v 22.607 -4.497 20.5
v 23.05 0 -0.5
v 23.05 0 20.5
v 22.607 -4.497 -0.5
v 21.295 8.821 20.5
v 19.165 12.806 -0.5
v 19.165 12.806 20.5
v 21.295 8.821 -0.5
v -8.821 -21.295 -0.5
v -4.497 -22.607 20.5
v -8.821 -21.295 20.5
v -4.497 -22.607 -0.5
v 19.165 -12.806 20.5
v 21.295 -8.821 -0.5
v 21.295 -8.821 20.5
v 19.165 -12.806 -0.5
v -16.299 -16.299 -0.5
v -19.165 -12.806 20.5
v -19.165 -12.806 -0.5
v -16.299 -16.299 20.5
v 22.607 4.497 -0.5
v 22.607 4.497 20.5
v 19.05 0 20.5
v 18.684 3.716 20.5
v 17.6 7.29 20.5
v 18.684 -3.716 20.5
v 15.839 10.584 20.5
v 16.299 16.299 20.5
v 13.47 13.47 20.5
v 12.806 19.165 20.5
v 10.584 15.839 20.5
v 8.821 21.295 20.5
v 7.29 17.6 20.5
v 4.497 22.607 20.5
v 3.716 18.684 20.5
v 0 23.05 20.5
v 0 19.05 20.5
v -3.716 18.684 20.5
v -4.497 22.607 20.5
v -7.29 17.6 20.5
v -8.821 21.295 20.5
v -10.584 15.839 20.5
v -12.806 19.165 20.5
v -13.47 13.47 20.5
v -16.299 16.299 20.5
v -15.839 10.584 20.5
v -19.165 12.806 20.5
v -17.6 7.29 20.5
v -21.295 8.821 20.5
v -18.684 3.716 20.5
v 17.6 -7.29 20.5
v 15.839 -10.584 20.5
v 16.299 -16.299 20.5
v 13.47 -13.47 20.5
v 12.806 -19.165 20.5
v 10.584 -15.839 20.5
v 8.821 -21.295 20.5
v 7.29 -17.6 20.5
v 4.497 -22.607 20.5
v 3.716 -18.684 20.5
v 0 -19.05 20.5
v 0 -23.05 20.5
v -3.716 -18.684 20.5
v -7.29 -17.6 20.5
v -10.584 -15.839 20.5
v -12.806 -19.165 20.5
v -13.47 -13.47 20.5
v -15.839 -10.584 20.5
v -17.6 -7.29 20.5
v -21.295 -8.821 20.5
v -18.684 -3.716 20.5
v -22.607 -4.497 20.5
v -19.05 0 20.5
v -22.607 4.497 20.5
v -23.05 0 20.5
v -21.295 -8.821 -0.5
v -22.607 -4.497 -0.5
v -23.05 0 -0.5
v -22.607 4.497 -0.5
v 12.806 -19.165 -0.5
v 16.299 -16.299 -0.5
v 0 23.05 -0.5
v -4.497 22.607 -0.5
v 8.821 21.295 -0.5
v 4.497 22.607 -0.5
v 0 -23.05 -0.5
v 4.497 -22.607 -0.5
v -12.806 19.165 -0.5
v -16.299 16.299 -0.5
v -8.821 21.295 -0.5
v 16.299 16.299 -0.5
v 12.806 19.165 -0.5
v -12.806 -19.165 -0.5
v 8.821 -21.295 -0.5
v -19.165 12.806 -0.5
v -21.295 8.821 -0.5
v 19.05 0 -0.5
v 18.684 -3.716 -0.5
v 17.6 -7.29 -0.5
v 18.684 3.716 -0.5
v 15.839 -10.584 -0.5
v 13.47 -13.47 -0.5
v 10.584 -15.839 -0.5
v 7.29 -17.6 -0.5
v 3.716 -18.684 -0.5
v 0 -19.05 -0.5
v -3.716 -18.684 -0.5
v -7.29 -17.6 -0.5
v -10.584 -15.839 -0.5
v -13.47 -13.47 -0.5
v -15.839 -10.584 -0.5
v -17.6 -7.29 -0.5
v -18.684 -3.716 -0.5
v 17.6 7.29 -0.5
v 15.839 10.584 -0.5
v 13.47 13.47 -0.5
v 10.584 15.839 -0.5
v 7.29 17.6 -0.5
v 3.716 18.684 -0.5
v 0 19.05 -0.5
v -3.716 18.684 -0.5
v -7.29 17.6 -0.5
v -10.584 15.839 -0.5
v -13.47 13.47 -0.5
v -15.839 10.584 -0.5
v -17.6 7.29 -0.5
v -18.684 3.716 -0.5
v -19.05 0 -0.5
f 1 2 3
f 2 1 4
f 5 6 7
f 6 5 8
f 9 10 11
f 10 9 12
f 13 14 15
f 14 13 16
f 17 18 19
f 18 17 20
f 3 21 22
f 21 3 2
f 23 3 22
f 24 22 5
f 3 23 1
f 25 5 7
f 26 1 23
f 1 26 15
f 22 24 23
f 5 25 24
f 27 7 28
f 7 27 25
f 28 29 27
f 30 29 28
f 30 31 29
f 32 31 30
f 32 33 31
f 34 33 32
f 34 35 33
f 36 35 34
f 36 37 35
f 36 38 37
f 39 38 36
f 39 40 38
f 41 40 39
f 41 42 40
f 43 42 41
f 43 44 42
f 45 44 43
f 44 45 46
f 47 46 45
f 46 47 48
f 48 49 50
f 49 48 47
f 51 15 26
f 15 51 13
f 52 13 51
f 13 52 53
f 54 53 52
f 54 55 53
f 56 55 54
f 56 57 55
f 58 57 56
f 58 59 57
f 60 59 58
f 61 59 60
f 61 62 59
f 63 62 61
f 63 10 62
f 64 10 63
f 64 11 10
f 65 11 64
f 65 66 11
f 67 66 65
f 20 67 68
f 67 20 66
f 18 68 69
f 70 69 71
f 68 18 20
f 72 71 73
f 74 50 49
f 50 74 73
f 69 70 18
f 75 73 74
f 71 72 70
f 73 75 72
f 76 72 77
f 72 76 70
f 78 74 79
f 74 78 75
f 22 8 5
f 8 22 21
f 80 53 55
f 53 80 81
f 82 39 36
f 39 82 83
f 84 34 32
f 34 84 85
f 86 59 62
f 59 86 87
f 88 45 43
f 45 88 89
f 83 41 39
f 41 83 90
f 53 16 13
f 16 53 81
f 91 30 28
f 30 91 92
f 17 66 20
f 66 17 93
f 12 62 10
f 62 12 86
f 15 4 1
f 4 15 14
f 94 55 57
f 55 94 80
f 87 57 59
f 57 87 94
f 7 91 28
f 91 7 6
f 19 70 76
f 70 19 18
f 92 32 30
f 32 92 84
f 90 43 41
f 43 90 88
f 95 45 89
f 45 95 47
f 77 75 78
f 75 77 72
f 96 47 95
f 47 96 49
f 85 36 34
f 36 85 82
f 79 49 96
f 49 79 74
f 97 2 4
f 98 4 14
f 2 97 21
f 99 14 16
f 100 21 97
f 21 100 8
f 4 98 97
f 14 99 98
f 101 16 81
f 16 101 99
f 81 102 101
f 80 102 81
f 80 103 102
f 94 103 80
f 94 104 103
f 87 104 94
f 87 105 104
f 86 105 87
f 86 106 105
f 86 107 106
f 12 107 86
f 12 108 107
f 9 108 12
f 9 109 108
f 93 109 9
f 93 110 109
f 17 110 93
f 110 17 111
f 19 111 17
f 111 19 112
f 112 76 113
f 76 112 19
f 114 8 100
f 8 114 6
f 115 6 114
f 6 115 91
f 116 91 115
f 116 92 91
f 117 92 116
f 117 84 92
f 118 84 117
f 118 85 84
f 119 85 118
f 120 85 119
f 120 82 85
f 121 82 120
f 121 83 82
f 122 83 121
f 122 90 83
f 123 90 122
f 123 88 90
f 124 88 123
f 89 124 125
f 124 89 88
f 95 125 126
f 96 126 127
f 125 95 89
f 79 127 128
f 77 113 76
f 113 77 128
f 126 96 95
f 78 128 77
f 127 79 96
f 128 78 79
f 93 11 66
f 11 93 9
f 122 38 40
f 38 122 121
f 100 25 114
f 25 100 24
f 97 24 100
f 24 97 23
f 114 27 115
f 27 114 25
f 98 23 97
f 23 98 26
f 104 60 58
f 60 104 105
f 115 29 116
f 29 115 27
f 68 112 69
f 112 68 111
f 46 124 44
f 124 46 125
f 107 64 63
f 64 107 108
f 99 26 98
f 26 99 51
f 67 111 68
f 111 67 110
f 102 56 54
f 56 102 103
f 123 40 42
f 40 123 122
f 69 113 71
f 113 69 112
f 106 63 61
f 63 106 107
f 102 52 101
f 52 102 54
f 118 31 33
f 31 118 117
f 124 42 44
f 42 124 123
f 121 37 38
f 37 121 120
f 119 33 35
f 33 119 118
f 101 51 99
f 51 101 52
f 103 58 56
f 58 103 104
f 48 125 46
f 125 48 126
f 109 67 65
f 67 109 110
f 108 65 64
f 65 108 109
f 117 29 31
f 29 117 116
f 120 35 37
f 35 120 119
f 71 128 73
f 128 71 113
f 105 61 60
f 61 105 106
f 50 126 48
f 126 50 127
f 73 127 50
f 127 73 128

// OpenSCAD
$fn = 32;

// ----------------------------------------------------------------------
// Two-module gear rim: z18 m2 and z28 m1.5, 20 mm wide
// ----------------------------------------------------------------------

// --- parameters (mm) ---
module_a = 2;             // first tooth module
teeth_a = 18;             // first band tooth count
module_b = 1.5;           // second tooth module
teeth_b = 28;             // second band tooth count
band_h = 8;               // height of one tooth band
web_t = 4;                // web thickness between the bands
total = 20;               // overall width over both bands
root_r = 15.5;            // root radius of the coarse band
hub_r = 23.05;            // hub radius
bore_d = 38.1;            // hub bore
hole_count = 6;           // lightening holes
hole_r = 11.24;           // lightening hole circle radius
hole_d = 4;               // lightening hole diameter

band_a = [[15.419, -1.579], [17.907, -1.575], [18.95, -1.21], [19.988, -0.682], [19.988, 0.682], [18.95, 1.21], [17.907, 1.575], [15.419, 1.579], [15.029, 3.79], [17.366, 4.644], [18.221, 5.344], [19.016, 6.196], [18.55, 7.477], [17.393, 7.618], [16.288, 7.605], [13.95, 6.757], [12.827, 8.702], [14.73, 10.304], [15.294, 11.254], [15.75, 12.326], [14.874, 13.37], [13.739, 13.107], [12.705, 12.717], [10.797, 11.121], [9.077, 12.564], [10.318, 14.72], [10.523, 15.806], [10.584, 16.97], [9.404, 17.651], [8.427, 17.016], [7.589, 16.296], [6.343, 14.143], [4.232, 14.911], [4.661, 17.362], [4.482, 18.452], [4.142, 19.566], [2.8, 19.803], [2.099, 18.872], [1.558, 17.909], [1.123, 15.459], [-1.123, 15.459], [-1.558, 17.909], [-2.099, 18.872], [-2.8, 19.803], [-4.142, 19.566], [-4.482, 18.452], [-4.661, 17.362], [-4.232, 14.911], [-6.343, 14.143], [-7.589, 16.296], [-8.427, 17.016], [-9.404, 17.651], [-10.584, 16.97], [-10.523, 15.806], [-10.318, 14.72], [-9.077, 12.564], [-10.797, 11.121], [-12.705, 12.717], [-13.739, 13.107], [-14.874, 13.37], [-15.75, 12.326], [-15.294, 11.254], [-14.73, 10.304], [-12.827, 8.702], [-13.95, 6.757], [-16.288, 7.605], [-17.393, 7.618], [-18.55, 7.477], [-19.016, 6.196], [-18.221, 5.344], [-17.366, 4.644], [-15.029, 3.79], [-15.419, 1.579], [-17.907, 1.575], [-18.95, 1.21], [-19.988, 0.682], [-19.988, -0.682], [-18.95, -1.21], [-17.907, -1.575], [-15.419, -1.579], [-15.029, -3.79], [-17.366, -4.644], [-18.221, -5.344], [-19.016, -6.196], [-18.55, -7.477], [-17.393, -7.618], [-16.288, -7.605], [-13.95, -6.757], [-12.827, -8.702], [-14.73, -10.304], [-15.294, -11.254], [-15.75, -12.326], [-14.874, -13.37], [-13.739, -13.107], [-12.705, -12.717], [-10.797, -11.121], [-9.077, -12.564], [-10.318, -14.72], [-10.523, -15.806], [-10.584, -16.97], [-9.404, -17.651], [-8.427, -17.016], [-7.589, -16.296], [-6.343, -14.143], [-4.232, -14.911], [-4.661, -17.362], [-4.482, -18.452], [-4.142, -19.566], [-2.8, -19.803], [-2.099, -18.872], [-1.558, -17.909], [-1.123, -15.459], [1.123, -15.459], [1.558, -17.909], [2.099, -18.872], [2.8, -19.803], [4.142, -19.566], [4.482, -18.452], [4.661, -17.362], [4.232, -14.911], [6.343, -14.143], [7.589, -16.296], [8.427, -17.016], [9.404, -17.651], [10.584, -16.97], [10.523, -15.806], [10.318, -14.72], [9.077, -12.564], [10.797, -11.121], [12.705, -12.717], [13.739, -13.107], [14.874, -13.37], [15.75, -12.326], [15.294, -11.254], [14.73, -10.304], [12.827, -8.702], [13.95, -6.757], [16.288, -7.605], [17.393, -7.618], [18.55, -7.477], [19.016, -6.196], [18.221, -5.344], [17.366, -4.644], [15.029, -3.79]];
band_b = [[19.077, -1.355], [20.65, -1.265], [21.573, -0.967], [22.493, -0.548], [22.493, 0.548], [21.573, 0.967], [20.65, 1.265], [19.077, 1.355], [18.9, 2.924], [20.414, 3.362], [21.247, 3.858], [22.051, 4.471], [21.807, 5.54], [20.817, 5.743], [19.851, 5.828], [18.297, 5.566], [17.775, 7.057], [19.154, 7.82], [19.856, 8.489], [20.504, 9.266], [20.028, 10.253], [19.017, 10.231], [18.057, 10.099], [16.6, 9.498], [15.76, 10.835], [16.934, 11.886], [17.469, 12.695], [17.928, 13.596], [17.244, 14.453], [16.264, 14.206], [15.357, 13.864], [14.07, 12.953], [12.953, 14.07], [13.864, 15.357], [14.206, 16.264], [14.453, 17.244], [13.596, 17.928], [12.695, 17.469], [11.886, 16.934], [10.835, 15.76], [9.498, 16.6], [10.099, 18.057], [10.231, 19.017], [10.253, 20.028], [9.266, 20.504], [8.489, 19.856], [7.82, 19.154], [7.057, 17.775], [5.566, 18.297], [5.828, 19.851], [5.743, 20.817], [5.54, 21.807], [4.471, 22.051], [3.858, 21.247], [3.362, 20.414], [2.924, 18.9], [1.355, 19.077], [1.265, 20.65], [0.967, 21.573], [0.548, 22.493], [-0.548, 22.493], [-0.967, 21.573], [-1.265, 20.65], [-1.355, 19.077], [-2.924, 18.9], [-3.362, 20.414], [-3.858, 21.247], [-4.471, 22.051], [-5.54, 21.807], [-5.743, 20.817], [-5.828, 19.851], [-5.566, 18.297], [-7.057, 17.775], [-7.82, 19.154], [-8.489, 19.856], [-9.266, 20.504], [-10.253, 20.028], [-10.231, 19.017], [-10.099, 18.057], [-9.498, 16.6], [-10.835, 15.76], [-11.886, 16.934], [-12.695, 17.469], [-13.596, 17.928], [-14.453, 17.244], [-14.206, 16.264], [-13.864, 15.357], [-12.953, 14.07], [-14.07, 12.953], [-15.357, 13.864], [-16.264, 14.206], [-17.244, 14.453], [-17.928, 13.596], [-17.469, 12.695], [-16.934, 11.886], [-15.76, 10.835], [-16.6, 9.498], [-18.057, 10.099], [-19.017, 10.231], [-20.028, 10.253], [-20.504, 9.266], [-19.856, 8.489], [-19.154, 7.82], [-17.775, 7.057], [-18.297, 5.566], [-19.851, 5.828], [-20.817, 5.743], [-21.807, 5.54], [-22.051, 4.471], [-21.247, 3.858], [-20.414, 3.362], [-18.9, 2.924], [-19.077, 1.355], [-20.65, 1.265], [-21.573, 0.967], [-22.493, 0.548], [-22.493, -0.548], [-21.573, -0.967], [-20.65, -1.265], [-19.077, -1.355], [-18.9, -2.924], [-20.414, -3.362], [-21.247, -3.858], [-22.051, -4.471], [-21.807, -5.54], [-20.817, -5.743], [-19.851, -5.828], [-18.297, -5.566], [-17.775, -7.057], [-19.154, -7.82], [-19.856, -8.489], [-20.504, -9.266], [-20.028, -10.253], [-19.017, -10.231], [-18.057, -10.099], [-16.6, -9.498], [-15.76, -10.835], [-16.934, -11.886], [-17.469, -12.695], [-17.928, -13.596], [-17.244, -14.453], [-16.264, -14.206], [-15.357, -13.864], [-14.07, -12.953], [-12.953, -14.07], [-13.864, -15.357], [-14.206, -16.264], [-14.453, -17.244], [-13.596, -17.928], [-12.695, -17.469], [-11.886, -16.934], [-10.835, -15.76], [-9.498, -16.6], [-10.099, -18.057], [-10.231, -19.017], [-10.253, -20.028], [-9.266, -20.504], [-8.489, -19.856], [-7.82, -19.154], [-7.057, -17.775], [-5.566, -18.297], [-5.828, -19.851], [-5.743, -20.817], [-5.54, -21.807], [-4.471, -22.051], [-3.858, -21.247], [-3.362, -20.414], [-2.924, -18.9], [-1.355, -19.077], [-1.265, -20.65], [-0.967, -21.573], [-0.548, -22.493], [0.548, -22.493], [0.967, -21.573], [1.265, -20.65], [1.355, -19.077], [2.924, -18.9], [3.362, -20.414], [3.858, -21.247], [4.471, -22.051], [5.54, -21.807], [5.743, -20.817], [5.828, -19.851], [5.566, -18.297], [7.057, -17.775], [7.82, -19.154], [8.489, -19.856], [9.266, -20.504], [10.253, -20.028], [10.231, -19.017], [10.099, -18.057], [9.498, -16.6], [10.835, -15.76], [11.886, -16.934], [12.695, -17.469], [13.596, -17.928], [14.453, -17.244], [14.206, -16.264], [13.864, -15.357], [12.953, -14.07], [14.07, -12.953], [15.357, -13.864], [16.264, -14.206], [17.244, -14.453], [17.928, -13.596], [17.469, -12.695], [16.934, -11.886], [15.76, -10.835], [16.6, -9.498], [18.057, -10.099], [19.017, -10.231], [20.028, -10.253], [20.504, -9.266], [19.856, -8.489], [19.154, -7.82], [17.775, -7.057], [18.297, -5.566], [19.851, -5.828], [20.817, -5.743], [21.807, -5.54], [22.051, -4.471], [21.247, -3.858], [20.414, -3.362], [18.9, -2.924]];

difference() {
  union() {
    /* tooth band A, overlapping the web by 0.4 mm */
    linear_extrude(height = band_h + 0.4) polygon(band_a);
    /* web */
    translate([0, 0, band_h - 0.4]) cylinder(h = web_t + 0.8, d = 2 * root_r);
    /* tooth band B */
    translate([0, 0, band_h + web_t]) linear_extrude(height = band_h + 0.4) polygon(band_b);
    /* hub */
    translate([0, 0, -0.5]) cylinder(h = total + 1.0, d = 2 * hub_r);
  }
  /* bore */
  translate([0, 0, -2.5]) cylinder(h = total + 5, d = bore_d);
  /* lightening holes through the web */
  for (i = [0 : hole_count - 1]) {
    a = i * 360 / hole_count;
    translate([hole_r * cos(a), hole_r * sin(a), -2.5]) cylinder(h = total + 5, d = hole_d);
  }
}
